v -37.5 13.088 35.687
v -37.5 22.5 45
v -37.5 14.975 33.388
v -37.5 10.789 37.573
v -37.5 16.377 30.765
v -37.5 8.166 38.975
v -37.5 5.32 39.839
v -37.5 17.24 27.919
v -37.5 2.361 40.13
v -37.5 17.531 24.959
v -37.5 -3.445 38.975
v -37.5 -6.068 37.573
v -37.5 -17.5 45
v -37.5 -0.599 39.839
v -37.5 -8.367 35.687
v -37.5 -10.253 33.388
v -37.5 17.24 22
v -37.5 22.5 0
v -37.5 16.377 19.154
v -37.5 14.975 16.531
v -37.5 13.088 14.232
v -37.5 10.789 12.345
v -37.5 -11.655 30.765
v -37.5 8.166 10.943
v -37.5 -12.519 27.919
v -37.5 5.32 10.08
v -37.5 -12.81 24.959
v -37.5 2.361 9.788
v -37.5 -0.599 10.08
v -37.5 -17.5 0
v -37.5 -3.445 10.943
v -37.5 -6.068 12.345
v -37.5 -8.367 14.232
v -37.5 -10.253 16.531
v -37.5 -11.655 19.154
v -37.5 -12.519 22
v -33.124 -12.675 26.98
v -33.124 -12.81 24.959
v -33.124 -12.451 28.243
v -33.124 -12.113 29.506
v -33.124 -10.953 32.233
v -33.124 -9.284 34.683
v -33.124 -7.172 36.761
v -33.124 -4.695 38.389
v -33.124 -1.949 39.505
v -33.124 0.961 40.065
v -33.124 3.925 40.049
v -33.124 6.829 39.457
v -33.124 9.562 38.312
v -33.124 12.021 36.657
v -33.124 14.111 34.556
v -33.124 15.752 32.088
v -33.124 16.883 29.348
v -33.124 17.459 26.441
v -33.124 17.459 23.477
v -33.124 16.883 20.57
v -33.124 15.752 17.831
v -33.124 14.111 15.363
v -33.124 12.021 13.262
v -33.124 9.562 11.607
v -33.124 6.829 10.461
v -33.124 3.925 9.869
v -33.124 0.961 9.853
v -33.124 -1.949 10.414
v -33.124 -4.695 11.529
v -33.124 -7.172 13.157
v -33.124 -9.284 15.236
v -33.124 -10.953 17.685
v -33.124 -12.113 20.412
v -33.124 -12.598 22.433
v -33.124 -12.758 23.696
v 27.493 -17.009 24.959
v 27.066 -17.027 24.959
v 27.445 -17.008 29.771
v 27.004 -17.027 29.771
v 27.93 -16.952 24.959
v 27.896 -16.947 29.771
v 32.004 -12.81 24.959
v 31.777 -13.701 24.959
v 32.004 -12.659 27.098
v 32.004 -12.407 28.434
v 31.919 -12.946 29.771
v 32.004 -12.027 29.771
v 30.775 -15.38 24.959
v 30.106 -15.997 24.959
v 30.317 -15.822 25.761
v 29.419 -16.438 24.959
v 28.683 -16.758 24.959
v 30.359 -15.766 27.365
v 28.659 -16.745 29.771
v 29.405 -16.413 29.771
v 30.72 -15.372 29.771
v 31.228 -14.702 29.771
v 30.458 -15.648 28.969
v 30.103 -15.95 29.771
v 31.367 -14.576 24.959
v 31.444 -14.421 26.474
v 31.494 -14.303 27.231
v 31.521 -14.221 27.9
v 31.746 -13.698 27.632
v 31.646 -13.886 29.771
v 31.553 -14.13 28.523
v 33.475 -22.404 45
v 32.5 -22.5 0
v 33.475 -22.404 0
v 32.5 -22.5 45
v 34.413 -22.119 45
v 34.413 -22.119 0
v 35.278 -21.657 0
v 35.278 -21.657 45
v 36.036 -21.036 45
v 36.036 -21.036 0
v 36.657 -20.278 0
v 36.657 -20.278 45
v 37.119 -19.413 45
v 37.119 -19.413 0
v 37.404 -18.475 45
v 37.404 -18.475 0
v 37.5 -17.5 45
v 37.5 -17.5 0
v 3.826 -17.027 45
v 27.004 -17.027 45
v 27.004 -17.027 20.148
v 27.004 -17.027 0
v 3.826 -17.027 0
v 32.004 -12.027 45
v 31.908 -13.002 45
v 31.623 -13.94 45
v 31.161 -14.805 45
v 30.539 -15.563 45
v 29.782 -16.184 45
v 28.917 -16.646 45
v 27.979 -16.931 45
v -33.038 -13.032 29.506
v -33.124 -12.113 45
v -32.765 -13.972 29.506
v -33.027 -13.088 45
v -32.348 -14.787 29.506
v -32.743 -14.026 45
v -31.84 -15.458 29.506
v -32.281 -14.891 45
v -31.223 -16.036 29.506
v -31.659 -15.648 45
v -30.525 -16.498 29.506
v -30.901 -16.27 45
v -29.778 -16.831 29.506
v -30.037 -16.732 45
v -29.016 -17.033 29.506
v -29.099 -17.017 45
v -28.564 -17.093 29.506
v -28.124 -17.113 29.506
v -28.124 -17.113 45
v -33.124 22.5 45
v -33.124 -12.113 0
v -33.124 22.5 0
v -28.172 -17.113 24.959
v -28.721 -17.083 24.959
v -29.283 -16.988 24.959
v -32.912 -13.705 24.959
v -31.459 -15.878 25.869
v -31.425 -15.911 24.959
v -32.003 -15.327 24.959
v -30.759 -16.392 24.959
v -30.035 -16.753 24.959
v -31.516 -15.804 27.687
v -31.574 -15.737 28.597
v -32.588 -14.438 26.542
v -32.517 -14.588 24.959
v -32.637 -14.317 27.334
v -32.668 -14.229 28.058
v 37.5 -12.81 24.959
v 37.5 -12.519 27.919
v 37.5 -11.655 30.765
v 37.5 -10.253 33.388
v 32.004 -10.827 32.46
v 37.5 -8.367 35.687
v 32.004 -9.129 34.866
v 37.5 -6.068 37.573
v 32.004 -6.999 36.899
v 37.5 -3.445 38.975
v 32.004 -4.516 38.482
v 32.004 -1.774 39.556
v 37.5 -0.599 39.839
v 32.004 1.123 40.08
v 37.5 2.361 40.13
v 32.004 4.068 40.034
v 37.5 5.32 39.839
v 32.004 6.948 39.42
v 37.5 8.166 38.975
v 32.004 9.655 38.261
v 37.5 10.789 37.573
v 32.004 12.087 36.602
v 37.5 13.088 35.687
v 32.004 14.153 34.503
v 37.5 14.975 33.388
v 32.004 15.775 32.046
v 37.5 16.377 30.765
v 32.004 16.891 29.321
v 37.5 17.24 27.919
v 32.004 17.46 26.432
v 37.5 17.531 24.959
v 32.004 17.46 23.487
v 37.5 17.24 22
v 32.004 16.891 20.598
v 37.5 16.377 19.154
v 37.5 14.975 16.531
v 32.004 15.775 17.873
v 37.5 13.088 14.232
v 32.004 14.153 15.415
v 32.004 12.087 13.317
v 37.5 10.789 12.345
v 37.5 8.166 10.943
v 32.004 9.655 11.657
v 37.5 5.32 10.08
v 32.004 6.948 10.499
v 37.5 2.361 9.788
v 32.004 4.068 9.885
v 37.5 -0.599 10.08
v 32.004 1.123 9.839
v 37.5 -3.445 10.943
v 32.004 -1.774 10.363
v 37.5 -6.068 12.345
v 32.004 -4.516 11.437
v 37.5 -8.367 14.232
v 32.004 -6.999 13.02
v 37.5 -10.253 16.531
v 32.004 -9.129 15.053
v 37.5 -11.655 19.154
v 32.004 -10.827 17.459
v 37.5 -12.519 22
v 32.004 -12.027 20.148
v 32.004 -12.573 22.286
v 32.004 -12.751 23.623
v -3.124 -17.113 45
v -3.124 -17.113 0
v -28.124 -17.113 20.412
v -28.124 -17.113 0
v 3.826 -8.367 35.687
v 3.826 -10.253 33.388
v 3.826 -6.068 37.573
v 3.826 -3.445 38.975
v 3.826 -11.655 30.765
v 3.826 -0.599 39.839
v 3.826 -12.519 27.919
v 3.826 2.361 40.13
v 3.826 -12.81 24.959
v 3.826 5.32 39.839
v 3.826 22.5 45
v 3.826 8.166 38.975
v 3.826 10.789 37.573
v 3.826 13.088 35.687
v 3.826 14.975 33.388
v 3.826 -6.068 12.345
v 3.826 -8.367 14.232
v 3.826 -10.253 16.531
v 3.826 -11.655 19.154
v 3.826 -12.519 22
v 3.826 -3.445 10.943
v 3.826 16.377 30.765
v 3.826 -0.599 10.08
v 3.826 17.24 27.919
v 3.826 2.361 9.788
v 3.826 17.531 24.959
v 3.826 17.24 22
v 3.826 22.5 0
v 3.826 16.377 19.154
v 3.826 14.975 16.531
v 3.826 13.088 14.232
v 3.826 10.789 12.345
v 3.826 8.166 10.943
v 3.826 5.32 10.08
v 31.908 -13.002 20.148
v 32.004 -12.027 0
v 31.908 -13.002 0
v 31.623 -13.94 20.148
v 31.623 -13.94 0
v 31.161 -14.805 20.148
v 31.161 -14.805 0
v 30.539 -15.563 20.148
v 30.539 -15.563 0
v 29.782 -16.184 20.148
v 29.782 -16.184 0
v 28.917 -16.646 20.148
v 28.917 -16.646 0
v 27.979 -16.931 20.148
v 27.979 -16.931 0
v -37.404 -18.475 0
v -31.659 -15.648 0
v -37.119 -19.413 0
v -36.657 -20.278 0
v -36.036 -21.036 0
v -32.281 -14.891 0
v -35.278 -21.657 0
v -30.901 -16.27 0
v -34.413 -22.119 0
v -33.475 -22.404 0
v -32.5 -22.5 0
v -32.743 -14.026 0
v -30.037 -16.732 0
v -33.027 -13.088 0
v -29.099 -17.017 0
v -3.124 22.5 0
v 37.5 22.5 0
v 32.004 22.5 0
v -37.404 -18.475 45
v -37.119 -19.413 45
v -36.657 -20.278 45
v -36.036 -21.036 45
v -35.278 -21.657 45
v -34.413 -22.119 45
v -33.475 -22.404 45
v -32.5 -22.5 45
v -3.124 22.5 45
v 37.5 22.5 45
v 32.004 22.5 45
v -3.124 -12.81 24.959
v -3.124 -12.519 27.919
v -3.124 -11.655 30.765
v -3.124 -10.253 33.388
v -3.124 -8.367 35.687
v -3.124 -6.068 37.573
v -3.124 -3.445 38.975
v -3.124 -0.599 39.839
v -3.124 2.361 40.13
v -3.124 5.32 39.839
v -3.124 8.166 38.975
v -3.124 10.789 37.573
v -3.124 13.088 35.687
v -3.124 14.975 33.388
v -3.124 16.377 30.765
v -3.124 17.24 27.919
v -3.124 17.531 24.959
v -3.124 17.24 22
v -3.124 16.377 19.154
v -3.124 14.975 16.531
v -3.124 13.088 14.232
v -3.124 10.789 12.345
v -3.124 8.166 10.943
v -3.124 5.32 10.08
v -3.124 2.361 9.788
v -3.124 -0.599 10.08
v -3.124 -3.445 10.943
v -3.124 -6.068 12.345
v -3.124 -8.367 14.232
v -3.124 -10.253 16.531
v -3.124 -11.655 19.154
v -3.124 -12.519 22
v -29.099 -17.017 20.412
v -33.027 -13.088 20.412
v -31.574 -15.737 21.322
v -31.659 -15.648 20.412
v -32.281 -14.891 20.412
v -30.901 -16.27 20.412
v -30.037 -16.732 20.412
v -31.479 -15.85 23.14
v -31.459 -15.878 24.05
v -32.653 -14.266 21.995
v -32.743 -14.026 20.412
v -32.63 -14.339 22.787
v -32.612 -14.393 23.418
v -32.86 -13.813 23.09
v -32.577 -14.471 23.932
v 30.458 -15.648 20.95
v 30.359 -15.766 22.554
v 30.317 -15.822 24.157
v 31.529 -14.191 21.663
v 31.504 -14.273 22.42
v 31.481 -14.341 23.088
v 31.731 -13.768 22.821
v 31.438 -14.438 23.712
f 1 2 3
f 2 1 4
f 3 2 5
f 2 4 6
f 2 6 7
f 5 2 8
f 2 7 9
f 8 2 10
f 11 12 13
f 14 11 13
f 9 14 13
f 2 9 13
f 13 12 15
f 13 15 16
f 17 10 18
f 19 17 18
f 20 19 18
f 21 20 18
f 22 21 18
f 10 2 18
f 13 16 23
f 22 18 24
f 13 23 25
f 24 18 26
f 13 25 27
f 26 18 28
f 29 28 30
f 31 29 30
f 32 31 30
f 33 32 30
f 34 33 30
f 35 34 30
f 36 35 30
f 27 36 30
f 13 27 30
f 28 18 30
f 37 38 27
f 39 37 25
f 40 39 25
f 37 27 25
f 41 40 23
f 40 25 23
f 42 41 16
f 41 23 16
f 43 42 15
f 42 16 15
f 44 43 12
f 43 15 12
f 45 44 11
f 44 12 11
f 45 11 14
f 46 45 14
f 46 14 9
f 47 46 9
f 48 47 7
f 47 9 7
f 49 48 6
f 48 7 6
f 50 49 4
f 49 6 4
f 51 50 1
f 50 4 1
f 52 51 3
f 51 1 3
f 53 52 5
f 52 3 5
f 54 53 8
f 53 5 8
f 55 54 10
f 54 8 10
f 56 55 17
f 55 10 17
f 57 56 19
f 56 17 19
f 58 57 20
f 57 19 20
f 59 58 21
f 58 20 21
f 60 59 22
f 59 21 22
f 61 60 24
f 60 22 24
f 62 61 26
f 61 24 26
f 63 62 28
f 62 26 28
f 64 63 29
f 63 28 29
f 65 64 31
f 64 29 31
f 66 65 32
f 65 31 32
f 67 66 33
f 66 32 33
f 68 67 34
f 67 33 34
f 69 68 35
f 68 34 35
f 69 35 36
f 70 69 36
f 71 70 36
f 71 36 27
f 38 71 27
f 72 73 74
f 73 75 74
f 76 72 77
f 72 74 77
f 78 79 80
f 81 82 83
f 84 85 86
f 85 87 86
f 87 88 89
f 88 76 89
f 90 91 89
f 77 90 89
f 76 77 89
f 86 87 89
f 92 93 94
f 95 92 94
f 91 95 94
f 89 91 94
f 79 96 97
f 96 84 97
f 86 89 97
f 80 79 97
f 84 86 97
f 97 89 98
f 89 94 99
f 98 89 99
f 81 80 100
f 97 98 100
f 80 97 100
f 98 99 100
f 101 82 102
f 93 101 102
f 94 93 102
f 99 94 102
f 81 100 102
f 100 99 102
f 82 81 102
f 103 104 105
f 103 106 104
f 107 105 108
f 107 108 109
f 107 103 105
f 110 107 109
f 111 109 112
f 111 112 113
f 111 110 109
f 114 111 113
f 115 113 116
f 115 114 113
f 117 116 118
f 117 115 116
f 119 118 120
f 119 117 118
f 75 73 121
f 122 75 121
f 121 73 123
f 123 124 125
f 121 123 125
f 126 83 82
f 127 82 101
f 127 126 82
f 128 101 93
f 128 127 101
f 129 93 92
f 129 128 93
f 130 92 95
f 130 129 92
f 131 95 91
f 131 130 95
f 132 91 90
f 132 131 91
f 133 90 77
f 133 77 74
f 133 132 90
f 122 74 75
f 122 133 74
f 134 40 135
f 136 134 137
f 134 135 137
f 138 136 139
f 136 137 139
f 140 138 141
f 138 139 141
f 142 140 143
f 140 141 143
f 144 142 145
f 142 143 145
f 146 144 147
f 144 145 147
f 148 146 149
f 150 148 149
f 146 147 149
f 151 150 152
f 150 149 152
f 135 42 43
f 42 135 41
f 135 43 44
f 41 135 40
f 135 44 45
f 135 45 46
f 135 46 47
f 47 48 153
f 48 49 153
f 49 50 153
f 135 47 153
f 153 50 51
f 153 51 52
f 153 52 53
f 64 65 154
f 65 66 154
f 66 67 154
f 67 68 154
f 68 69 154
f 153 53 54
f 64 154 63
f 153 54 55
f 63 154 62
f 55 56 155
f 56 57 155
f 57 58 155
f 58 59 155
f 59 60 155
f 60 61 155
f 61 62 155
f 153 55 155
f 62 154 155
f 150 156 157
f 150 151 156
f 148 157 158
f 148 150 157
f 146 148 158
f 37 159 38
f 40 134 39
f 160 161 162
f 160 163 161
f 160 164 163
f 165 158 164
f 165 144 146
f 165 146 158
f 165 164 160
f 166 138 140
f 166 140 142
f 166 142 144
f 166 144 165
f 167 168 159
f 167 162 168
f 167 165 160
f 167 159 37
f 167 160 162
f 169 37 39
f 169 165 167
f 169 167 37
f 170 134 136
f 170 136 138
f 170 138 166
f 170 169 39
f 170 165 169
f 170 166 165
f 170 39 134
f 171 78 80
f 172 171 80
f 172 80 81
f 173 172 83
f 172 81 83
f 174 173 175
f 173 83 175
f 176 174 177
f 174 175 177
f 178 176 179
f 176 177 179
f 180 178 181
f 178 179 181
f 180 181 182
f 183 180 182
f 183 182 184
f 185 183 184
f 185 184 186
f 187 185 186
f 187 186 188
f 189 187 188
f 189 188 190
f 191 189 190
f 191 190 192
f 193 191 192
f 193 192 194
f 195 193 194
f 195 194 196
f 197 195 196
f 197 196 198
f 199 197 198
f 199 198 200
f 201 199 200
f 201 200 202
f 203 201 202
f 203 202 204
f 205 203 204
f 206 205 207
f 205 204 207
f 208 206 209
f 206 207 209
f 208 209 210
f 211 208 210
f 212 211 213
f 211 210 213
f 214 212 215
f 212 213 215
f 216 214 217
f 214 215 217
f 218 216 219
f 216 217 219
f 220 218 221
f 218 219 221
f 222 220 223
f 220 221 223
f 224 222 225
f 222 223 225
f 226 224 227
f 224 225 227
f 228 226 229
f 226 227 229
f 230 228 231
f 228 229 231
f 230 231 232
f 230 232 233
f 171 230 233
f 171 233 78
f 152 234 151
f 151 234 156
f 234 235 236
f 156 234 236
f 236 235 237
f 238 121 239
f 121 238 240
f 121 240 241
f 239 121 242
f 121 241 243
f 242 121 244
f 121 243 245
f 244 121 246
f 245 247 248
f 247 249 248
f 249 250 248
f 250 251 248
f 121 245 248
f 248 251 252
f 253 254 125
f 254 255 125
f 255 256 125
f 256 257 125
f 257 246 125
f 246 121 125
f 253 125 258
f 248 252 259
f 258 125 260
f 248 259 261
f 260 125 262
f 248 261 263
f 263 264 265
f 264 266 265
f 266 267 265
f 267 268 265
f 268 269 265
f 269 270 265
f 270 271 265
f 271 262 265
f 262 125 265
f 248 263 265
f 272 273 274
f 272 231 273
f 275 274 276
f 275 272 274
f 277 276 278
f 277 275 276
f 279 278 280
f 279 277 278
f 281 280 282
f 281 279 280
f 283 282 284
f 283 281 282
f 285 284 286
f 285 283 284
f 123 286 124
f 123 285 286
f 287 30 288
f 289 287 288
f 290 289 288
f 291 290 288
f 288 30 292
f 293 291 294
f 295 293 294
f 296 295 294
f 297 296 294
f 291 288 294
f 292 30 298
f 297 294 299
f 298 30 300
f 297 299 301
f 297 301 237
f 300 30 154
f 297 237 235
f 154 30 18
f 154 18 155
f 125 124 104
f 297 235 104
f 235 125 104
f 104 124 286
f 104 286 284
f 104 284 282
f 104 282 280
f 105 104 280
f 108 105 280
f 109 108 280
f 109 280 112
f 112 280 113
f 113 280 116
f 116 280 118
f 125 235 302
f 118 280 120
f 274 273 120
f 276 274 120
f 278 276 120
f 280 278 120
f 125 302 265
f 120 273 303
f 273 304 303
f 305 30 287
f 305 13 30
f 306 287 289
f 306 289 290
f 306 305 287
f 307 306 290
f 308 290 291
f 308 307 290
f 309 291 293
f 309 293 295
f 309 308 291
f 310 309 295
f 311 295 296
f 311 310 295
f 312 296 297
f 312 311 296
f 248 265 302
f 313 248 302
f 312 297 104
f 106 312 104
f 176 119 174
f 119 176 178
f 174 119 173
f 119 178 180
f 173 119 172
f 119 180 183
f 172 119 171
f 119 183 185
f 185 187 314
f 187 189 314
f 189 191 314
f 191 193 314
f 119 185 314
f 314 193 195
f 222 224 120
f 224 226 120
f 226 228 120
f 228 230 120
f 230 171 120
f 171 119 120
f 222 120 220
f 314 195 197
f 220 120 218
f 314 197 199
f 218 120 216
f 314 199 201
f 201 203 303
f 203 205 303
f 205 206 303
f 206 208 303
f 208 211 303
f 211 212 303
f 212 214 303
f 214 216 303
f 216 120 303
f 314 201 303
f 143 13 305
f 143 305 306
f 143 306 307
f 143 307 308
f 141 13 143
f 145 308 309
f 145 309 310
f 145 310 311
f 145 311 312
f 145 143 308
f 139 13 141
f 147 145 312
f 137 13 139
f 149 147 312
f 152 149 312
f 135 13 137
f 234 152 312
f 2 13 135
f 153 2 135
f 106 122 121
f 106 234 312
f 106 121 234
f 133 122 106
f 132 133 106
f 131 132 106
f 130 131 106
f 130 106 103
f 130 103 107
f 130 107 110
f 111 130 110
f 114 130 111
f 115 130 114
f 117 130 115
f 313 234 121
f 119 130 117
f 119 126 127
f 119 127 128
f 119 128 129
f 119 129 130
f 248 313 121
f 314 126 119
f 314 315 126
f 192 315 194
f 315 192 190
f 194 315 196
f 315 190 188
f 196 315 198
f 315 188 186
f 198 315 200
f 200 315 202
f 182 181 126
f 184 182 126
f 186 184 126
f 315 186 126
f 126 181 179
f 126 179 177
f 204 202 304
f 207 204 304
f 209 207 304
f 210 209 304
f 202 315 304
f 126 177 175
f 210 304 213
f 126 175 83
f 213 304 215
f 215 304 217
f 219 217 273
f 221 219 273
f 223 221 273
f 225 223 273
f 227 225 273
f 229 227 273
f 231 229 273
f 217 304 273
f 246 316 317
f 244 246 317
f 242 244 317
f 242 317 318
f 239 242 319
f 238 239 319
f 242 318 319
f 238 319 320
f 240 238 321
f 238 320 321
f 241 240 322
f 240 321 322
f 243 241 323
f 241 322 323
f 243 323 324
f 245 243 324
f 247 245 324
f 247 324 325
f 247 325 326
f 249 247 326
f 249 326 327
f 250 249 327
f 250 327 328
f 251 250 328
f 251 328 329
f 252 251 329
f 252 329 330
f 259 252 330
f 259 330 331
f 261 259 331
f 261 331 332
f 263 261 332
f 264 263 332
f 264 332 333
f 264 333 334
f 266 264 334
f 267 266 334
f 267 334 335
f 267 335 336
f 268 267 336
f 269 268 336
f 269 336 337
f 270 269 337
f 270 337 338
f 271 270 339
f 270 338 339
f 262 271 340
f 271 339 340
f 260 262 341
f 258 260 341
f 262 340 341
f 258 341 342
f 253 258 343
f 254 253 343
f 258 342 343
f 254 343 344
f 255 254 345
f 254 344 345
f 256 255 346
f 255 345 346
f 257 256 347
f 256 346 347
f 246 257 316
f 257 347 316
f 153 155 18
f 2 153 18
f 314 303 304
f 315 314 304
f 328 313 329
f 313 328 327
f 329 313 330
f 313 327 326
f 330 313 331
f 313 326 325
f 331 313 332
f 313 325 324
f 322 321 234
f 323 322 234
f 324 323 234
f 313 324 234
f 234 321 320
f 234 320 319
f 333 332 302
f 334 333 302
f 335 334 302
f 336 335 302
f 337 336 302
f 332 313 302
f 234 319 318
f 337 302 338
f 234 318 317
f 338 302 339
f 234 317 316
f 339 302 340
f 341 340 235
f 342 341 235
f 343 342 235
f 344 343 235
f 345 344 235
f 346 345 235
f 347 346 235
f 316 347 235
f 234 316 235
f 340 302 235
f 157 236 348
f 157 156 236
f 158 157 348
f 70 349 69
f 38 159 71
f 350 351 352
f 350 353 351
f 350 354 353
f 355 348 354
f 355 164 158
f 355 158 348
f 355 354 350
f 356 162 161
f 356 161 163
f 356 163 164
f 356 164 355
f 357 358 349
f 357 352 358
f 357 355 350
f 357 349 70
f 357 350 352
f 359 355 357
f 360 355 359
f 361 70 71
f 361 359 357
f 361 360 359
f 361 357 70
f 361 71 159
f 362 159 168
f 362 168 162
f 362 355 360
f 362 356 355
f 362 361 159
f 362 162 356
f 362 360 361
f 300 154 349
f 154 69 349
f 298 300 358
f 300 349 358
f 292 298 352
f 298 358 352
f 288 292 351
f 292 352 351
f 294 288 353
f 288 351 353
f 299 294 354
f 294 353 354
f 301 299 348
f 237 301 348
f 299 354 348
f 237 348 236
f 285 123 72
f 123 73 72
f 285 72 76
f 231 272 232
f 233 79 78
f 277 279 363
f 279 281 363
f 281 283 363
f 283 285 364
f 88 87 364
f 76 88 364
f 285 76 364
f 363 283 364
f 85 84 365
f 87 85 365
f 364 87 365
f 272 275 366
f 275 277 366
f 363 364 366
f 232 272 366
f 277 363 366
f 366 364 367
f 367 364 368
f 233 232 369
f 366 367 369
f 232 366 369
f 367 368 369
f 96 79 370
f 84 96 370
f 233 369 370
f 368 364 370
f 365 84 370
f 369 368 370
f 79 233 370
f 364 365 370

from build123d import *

# Parameters (mm, degrees)
F1_DEPTH = 45
F2_R     = 5
F3_R     = 15.170824
F4_DEPTH = 100
F5_R     = 5


with BuildPart() as f1:
    # F0 (on Top) → F1 (new body)
    with BuildSketch(Plane.XY):
        Polygon((-33.123519, 22.5), (-37.5, 22.5), (-37.5, -22.5), (37.5, -22.5), (37.5, 22.5), (32.003852, 22.5), (32.003852, -17.027041), (3.825535, -17.027041), (3.825535, 22.5), (-3.123519, 22.5), (-3.123519, -17.112833), (-33.123519, -17.112833), align=None)
    extrude(amount=F1_DEPTH)

    # F2
    f2_edges = [f1.edges().sort_by_distance(p)[0] for p in [
        (37.5, -22.5, 22.5),
        (-37.5, -22.5, 22.5),
    ]]
    fillet(f2_edges, radius=F2_R)

    # F3 (on face) → F4 (cut)
    with BuildSketch(Plane(origin=(-37.5, 0, 0), x_dir=(0, -1, 0), z_dir=(-1, 0, 0))):
        with Locations((-2.36058, 24.959255)):
            Circle(F3_R)
    extrude(amount=-F4_DEPTH, mode=Mode.SUBTRACT)

    # F5
    f5_edges = [f1.edges().sort_by_distance(p)[0] for p in [
        (-33.123519, -17.112833, 22.5),
        (32.003852, -17.027041, 22.5),
    ]]
    fillet(f5_edges, radius=F5_R)


solid = f1.part
